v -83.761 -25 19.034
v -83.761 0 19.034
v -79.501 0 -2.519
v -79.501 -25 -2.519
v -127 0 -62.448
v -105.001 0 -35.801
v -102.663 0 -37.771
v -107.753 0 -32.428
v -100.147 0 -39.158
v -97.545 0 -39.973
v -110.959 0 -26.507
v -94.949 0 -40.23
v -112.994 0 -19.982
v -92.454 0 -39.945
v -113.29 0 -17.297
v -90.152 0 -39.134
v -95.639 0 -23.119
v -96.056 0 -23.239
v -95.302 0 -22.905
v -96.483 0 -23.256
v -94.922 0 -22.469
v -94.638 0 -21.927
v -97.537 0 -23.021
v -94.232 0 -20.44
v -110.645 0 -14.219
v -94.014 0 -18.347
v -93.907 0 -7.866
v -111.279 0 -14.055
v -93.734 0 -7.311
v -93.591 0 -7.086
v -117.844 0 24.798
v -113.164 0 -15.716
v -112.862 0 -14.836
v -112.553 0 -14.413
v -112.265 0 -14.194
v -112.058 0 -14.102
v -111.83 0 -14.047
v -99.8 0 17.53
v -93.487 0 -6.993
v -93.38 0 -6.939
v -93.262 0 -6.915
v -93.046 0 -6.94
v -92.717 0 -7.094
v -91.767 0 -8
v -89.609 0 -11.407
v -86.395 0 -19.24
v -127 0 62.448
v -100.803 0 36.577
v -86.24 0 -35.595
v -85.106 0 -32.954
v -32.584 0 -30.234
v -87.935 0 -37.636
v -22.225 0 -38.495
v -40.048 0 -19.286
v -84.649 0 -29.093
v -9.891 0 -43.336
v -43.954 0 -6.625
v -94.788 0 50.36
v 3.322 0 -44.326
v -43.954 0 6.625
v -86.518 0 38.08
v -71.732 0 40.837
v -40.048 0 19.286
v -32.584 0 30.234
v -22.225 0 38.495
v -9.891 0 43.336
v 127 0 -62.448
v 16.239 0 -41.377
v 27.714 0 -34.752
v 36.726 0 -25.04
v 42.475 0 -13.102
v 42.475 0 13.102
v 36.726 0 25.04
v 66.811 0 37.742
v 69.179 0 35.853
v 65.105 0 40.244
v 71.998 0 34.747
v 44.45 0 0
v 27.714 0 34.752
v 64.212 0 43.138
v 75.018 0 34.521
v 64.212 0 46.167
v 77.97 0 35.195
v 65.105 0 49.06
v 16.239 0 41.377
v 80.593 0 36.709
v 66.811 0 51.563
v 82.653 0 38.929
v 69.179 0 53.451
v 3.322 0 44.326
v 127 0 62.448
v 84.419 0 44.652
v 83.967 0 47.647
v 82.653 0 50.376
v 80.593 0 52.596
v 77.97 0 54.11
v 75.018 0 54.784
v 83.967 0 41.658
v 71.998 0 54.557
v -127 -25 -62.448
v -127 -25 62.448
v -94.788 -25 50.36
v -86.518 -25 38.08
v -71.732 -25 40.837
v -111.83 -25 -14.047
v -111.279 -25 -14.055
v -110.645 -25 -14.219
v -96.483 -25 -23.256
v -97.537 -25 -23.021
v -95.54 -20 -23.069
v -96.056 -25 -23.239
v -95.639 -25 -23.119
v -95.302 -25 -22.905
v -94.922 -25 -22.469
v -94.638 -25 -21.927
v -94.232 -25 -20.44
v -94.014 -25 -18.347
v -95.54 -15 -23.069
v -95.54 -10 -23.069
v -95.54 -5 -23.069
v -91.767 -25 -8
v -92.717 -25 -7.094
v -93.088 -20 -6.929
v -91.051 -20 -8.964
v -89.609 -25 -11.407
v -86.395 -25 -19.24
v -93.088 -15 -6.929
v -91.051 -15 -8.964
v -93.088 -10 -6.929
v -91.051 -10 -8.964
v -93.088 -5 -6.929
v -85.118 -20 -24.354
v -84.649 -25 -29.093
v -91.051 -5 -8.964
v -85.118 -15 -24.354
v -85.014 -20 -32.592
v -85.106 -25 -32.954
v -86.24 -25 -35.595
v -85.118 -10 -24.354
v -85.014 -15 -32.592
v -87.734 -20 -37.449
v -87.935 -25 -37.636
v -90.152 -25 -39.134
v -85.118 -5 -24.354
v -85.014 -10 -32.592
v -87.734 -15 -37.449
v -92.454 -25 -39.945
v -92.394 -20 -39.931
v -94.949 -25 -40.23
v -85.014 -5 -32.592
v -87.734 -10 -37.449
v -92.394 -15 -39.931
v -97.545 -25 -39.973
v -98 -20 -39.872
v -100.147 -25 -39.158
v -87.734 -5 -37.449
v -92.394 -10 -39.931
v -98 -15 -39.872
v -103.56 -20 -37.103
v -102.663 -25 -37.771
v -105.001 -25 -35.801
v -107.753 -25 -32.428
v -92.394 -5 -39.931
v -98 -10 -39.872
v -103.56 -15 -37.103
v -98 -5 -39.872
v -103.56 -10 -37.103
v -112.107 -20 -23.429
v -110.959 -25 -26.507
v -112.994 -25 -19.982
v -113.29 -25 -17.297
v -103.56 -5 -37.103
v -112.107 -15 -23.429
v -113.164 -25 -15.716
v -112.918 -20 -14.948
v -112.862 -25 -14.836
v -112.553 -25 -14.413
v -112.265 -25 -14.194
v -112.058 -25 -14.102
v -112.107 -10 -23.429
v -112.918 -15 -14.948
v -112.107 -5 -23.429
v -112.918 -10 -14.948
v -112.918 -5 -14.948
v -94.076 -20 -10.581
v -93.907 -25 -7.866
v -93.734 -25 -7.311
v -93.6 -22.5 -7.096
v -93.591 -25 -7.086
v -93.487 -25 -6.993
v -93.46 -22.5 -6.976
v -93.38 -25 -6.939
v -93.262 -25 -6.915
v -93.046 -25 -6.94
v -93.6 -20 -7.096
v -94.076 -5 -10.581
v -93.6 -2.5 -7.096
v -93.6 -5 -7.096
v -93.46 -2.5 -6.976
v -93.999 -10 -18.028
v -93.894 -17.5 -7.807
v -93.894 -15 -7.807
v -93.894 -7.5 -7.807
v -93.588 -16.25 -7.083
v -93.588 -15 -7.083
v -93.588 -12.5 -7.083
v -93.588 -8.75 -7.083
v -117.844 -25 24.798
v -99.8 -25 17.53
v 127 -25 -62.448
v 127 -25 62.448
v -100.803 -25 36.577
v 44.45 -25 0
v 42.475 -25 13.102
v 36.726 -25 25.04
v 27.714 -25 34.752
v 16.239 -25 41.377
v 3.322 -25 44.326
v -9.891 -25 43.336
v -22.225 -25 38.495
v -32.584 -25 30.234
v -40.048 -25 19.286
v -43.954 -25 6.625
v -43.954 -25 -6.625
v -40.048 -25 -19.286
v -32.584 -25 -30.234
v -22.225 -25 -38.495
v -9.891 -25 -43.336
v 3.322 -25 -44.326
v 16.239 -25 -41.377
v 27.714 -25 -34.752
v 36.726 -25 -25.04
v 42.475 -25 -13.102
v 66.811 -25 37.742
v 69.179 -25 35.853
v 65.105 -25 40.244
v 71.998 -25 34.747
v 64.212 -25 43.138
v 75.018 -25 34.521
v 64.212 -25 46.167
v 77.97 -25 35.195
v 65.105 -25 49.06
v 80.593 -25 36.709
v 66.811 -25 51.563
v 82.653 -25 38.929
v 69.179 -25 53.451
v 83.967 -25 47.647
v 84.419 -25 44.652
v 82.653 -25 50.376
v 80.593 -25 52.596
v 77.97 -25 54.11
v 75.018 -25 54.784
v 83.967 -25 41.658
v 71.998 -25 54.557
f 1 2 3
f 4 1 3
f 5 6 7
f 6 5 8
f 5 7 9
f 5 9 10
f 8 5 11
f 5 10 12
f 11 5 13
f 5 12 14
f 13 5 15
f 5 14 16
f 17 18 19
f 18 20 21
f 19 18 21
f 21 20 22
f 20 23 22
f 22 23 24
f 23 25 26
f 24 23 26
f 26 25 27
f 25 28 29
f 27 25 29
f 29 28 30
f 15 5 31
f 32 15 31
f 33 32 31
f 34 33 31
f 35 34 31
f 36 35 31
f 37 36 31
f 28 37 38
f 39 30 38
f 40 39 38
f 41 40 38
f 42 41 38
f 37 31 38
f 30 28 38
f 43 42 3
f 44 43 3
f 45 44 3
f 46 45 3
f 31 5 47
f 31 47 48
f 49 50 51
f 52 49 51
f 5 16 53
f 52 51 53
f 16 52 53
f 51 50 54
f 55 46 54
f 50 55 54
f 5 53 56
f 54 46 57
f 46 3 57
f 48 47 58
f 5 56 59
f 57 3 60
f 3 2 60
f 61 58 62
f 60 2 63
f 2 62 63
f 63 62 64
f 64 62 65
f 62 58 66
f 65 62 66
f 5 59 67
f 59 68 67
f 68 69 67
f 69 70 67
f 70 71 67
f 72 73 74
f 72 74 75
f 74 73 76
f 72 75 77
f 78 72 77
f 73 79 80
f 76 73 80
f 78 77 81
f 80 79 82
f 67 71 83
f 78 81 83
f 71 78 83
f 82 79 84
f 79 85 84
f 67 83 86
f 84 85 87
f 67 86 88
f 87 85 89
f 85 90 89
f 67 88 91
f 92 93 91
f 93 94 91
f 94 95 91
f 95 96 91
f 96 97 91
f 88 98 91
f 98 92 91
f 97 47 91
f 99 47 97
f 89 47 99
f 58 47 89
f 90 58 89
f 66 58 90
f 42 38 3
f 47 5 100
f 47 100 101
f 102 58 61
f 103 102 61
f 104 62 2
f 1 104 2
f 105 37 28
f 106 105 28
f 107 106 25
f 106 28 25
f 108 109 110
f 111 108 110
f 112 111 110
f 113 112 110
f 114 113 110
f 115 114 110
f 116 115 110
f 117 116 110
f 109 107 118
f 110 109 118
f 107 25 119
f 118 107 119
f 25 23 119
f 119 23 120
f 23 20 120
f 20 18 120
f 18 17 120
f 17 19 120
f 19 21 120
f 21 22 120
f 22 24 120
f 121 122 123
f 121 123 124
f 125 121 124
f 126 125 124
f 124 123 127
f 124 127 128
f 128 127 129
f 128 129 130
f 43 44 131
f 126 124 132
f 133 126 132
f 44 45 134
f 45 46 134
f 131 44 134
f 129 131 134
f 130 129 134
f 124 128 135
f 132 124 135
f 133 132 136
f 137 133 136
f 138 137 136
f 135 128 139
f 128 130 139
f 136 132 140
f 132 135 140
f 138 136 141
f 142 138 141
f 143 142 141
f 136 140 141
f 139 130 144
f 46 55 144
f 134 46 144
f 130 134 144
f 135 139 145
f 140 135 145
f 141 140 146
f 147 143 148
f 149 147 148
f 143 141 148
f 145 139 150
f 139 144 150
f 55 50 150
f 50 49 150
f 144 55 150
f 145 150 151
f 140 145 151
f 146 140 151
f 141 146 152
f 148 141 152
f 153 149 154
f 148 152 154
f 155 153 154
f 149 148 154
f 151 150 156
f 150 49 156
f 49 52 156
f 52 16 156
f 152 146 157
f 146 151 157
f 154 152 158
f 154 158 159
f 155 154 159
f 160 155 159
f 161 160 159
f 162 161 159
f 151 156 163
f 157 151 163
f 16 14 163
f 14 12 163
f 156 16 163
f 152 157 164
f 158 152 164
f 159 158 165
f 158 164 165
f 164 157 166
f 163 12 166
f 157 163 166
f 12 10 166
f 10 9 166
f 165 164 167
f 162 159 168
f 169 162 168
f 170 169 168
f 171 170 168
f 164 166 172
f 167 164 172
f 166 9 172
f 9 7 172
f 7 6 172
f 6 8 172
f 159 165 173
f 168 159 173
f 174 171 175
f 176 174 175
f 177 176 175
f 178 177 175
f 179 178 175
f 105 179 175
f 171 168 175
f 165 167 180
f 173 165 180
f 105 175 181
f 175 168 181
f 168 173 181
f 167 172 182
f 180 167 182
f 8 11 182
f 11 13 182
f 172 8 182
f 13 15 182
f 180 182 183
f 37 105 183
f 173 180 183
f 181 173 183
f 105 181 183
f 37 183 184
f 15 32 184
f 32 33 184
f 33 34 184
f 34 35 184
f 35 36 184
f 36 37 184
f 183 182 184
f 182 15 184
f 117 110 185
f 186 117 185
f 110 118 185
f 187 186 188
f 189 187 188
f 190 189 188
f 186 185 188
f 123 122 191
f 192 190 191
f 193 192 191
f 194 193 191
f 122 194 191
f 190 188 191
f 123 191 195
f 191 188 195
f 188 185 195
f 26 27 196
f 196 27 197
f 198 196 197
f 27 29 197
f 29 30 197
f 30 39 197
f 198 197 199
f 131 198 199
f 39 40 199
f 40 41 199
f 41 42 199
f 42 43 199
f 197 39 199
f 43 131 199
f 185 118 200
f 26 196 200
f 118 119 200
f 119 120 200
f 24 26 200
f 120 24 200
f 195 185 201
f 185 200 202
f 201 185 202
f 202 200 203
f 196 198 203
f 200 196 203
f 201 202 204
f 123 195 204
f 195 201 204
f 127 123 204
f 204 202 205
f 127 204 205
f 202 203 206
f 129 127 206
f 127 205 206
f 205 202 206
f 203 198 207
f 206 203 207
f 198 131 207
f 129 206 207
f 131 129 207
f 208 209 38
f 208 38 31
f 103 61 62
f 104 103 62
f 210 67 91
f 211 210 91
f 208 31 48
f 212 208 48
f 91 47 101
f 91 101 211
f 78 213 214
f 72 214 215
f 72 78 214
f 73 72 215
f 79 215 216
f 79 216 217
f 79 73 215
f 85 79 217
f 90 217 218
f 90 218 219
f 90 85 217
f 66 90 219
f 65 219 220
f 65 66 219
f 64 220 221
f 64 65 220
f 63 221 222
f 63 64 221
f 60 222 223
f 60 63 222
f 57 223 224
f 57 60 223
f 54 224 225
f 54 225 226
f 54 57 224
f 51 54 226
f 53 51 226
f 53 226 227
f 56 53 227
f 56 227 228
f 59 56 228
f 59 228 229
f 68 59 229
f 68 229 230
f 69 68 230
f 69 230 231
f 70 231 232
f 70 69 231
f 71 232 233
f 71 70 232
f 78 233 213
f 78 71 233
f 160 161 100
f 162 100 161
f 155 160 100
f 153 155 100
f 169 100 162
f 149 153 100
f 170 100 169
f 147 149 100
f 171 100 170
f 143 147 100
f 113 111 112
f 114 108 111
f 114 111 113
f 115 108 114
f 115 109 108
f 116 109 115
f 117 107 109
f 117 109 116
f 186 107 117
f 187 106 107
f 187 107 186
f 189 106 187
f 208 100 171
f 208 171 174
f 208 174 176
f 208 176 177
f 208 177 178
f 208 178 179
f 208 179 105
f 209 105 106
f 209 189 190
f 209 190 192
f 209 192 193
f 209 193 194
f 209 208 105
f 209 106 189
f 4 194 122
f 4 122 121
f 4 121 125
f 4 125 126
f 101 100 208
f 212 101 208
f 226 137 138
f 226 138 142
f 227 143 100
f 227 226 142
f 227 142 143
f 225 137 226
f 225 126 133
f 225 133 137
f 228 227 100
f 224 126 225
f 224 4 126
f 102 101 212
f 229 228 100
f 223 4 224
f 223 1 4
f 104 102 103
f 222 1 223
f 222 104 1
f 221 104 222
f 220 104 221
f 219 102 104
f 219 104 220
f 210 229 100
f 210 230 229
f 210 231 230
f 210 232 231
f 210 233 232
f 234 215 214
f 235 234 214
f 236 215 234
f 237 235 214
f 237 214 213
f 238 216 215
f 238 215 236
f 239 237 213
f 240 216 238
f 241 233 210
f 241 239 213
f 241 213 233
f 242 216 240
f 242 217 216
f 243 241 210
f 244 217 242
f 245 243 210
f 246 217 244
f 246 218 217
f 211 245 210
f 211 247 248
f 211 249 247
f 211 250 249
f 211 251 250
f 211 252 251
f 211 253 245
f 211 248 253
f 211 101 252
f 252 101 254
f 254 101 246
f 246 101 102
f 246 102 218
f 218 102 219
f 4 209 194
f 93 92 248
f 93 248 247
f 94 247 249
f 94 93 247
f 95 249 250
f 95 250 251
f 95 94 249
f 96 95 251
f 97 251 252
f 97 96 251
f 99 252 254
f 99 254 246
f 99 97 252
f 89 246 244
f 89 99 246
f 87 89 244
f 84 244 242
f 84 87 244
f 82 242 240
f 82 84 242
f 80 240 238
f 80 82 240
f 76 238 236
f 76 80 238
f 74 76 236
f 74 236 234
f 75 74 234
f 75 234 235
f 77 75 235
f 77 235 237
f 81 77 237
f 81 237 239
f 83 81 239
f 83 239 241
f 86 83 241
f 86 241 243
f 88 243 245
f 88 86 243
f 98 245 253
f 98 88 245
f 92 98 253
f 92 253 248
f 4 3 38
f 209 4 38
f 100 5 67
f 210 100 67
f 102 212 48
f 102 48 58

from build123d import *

# Parameters (mm, degrees)
F0_W     = 254
F0_H     = 124.89681042
F0_R     = 44.45
F0_R_2   = 10.16
F1_DEPTH = 25


with BuildPart() as f1:
    # F0 (on Front) → F1 (new body)
    with BuildSketch(Plane.XZ):
        Rectangle(F0_W, F0_H)
        with BuildLine():
            add(Edge.make_bspline(
                [(-111.8297055364, -14.0468934551), (-108.425997633, -13.5337411193), (-89.7890833693, -35.4029321863), (-98.3591092209, 8.4755792258), (-75.3691059536, -38.0833989268), (-107.6188350377, -45.052064293), (-115.733462609, -14.6354345746), (-111.8297055364, -14.0468934551)],
                knots=[0, 0, 0, 0, 0.1888961726, 0.3648878018, 0.5921138685, 0.7833525112, 1, 1, 1, 1], degree=3))
        make_face(mode=Mode.SUBTRACT)
        Polygon((-117.8443804383, 24.7979369015), (-100.8027791977, 36.5766920149), (-94.7880968451, 50.360340625), (-86.5179076791, 38.0803644657), (-71.731813252, 40.8370904624), (-83.7611779571, 19.0338641405), (-79.5007795095, -2.5187504943), (-99.8003333807, 17.5301935524), align=None, mode=Mode.SUBTRACT)
        Circle(F0_R, mode=Mode.SUBTRACT)
        with Locations((74.2585881539, 44.6522309495)):
            Circle(F0_R_2, mode=Mode.SUBTRACT)
    extrude(amount=F1_DEPTH)


solid = f1.part
